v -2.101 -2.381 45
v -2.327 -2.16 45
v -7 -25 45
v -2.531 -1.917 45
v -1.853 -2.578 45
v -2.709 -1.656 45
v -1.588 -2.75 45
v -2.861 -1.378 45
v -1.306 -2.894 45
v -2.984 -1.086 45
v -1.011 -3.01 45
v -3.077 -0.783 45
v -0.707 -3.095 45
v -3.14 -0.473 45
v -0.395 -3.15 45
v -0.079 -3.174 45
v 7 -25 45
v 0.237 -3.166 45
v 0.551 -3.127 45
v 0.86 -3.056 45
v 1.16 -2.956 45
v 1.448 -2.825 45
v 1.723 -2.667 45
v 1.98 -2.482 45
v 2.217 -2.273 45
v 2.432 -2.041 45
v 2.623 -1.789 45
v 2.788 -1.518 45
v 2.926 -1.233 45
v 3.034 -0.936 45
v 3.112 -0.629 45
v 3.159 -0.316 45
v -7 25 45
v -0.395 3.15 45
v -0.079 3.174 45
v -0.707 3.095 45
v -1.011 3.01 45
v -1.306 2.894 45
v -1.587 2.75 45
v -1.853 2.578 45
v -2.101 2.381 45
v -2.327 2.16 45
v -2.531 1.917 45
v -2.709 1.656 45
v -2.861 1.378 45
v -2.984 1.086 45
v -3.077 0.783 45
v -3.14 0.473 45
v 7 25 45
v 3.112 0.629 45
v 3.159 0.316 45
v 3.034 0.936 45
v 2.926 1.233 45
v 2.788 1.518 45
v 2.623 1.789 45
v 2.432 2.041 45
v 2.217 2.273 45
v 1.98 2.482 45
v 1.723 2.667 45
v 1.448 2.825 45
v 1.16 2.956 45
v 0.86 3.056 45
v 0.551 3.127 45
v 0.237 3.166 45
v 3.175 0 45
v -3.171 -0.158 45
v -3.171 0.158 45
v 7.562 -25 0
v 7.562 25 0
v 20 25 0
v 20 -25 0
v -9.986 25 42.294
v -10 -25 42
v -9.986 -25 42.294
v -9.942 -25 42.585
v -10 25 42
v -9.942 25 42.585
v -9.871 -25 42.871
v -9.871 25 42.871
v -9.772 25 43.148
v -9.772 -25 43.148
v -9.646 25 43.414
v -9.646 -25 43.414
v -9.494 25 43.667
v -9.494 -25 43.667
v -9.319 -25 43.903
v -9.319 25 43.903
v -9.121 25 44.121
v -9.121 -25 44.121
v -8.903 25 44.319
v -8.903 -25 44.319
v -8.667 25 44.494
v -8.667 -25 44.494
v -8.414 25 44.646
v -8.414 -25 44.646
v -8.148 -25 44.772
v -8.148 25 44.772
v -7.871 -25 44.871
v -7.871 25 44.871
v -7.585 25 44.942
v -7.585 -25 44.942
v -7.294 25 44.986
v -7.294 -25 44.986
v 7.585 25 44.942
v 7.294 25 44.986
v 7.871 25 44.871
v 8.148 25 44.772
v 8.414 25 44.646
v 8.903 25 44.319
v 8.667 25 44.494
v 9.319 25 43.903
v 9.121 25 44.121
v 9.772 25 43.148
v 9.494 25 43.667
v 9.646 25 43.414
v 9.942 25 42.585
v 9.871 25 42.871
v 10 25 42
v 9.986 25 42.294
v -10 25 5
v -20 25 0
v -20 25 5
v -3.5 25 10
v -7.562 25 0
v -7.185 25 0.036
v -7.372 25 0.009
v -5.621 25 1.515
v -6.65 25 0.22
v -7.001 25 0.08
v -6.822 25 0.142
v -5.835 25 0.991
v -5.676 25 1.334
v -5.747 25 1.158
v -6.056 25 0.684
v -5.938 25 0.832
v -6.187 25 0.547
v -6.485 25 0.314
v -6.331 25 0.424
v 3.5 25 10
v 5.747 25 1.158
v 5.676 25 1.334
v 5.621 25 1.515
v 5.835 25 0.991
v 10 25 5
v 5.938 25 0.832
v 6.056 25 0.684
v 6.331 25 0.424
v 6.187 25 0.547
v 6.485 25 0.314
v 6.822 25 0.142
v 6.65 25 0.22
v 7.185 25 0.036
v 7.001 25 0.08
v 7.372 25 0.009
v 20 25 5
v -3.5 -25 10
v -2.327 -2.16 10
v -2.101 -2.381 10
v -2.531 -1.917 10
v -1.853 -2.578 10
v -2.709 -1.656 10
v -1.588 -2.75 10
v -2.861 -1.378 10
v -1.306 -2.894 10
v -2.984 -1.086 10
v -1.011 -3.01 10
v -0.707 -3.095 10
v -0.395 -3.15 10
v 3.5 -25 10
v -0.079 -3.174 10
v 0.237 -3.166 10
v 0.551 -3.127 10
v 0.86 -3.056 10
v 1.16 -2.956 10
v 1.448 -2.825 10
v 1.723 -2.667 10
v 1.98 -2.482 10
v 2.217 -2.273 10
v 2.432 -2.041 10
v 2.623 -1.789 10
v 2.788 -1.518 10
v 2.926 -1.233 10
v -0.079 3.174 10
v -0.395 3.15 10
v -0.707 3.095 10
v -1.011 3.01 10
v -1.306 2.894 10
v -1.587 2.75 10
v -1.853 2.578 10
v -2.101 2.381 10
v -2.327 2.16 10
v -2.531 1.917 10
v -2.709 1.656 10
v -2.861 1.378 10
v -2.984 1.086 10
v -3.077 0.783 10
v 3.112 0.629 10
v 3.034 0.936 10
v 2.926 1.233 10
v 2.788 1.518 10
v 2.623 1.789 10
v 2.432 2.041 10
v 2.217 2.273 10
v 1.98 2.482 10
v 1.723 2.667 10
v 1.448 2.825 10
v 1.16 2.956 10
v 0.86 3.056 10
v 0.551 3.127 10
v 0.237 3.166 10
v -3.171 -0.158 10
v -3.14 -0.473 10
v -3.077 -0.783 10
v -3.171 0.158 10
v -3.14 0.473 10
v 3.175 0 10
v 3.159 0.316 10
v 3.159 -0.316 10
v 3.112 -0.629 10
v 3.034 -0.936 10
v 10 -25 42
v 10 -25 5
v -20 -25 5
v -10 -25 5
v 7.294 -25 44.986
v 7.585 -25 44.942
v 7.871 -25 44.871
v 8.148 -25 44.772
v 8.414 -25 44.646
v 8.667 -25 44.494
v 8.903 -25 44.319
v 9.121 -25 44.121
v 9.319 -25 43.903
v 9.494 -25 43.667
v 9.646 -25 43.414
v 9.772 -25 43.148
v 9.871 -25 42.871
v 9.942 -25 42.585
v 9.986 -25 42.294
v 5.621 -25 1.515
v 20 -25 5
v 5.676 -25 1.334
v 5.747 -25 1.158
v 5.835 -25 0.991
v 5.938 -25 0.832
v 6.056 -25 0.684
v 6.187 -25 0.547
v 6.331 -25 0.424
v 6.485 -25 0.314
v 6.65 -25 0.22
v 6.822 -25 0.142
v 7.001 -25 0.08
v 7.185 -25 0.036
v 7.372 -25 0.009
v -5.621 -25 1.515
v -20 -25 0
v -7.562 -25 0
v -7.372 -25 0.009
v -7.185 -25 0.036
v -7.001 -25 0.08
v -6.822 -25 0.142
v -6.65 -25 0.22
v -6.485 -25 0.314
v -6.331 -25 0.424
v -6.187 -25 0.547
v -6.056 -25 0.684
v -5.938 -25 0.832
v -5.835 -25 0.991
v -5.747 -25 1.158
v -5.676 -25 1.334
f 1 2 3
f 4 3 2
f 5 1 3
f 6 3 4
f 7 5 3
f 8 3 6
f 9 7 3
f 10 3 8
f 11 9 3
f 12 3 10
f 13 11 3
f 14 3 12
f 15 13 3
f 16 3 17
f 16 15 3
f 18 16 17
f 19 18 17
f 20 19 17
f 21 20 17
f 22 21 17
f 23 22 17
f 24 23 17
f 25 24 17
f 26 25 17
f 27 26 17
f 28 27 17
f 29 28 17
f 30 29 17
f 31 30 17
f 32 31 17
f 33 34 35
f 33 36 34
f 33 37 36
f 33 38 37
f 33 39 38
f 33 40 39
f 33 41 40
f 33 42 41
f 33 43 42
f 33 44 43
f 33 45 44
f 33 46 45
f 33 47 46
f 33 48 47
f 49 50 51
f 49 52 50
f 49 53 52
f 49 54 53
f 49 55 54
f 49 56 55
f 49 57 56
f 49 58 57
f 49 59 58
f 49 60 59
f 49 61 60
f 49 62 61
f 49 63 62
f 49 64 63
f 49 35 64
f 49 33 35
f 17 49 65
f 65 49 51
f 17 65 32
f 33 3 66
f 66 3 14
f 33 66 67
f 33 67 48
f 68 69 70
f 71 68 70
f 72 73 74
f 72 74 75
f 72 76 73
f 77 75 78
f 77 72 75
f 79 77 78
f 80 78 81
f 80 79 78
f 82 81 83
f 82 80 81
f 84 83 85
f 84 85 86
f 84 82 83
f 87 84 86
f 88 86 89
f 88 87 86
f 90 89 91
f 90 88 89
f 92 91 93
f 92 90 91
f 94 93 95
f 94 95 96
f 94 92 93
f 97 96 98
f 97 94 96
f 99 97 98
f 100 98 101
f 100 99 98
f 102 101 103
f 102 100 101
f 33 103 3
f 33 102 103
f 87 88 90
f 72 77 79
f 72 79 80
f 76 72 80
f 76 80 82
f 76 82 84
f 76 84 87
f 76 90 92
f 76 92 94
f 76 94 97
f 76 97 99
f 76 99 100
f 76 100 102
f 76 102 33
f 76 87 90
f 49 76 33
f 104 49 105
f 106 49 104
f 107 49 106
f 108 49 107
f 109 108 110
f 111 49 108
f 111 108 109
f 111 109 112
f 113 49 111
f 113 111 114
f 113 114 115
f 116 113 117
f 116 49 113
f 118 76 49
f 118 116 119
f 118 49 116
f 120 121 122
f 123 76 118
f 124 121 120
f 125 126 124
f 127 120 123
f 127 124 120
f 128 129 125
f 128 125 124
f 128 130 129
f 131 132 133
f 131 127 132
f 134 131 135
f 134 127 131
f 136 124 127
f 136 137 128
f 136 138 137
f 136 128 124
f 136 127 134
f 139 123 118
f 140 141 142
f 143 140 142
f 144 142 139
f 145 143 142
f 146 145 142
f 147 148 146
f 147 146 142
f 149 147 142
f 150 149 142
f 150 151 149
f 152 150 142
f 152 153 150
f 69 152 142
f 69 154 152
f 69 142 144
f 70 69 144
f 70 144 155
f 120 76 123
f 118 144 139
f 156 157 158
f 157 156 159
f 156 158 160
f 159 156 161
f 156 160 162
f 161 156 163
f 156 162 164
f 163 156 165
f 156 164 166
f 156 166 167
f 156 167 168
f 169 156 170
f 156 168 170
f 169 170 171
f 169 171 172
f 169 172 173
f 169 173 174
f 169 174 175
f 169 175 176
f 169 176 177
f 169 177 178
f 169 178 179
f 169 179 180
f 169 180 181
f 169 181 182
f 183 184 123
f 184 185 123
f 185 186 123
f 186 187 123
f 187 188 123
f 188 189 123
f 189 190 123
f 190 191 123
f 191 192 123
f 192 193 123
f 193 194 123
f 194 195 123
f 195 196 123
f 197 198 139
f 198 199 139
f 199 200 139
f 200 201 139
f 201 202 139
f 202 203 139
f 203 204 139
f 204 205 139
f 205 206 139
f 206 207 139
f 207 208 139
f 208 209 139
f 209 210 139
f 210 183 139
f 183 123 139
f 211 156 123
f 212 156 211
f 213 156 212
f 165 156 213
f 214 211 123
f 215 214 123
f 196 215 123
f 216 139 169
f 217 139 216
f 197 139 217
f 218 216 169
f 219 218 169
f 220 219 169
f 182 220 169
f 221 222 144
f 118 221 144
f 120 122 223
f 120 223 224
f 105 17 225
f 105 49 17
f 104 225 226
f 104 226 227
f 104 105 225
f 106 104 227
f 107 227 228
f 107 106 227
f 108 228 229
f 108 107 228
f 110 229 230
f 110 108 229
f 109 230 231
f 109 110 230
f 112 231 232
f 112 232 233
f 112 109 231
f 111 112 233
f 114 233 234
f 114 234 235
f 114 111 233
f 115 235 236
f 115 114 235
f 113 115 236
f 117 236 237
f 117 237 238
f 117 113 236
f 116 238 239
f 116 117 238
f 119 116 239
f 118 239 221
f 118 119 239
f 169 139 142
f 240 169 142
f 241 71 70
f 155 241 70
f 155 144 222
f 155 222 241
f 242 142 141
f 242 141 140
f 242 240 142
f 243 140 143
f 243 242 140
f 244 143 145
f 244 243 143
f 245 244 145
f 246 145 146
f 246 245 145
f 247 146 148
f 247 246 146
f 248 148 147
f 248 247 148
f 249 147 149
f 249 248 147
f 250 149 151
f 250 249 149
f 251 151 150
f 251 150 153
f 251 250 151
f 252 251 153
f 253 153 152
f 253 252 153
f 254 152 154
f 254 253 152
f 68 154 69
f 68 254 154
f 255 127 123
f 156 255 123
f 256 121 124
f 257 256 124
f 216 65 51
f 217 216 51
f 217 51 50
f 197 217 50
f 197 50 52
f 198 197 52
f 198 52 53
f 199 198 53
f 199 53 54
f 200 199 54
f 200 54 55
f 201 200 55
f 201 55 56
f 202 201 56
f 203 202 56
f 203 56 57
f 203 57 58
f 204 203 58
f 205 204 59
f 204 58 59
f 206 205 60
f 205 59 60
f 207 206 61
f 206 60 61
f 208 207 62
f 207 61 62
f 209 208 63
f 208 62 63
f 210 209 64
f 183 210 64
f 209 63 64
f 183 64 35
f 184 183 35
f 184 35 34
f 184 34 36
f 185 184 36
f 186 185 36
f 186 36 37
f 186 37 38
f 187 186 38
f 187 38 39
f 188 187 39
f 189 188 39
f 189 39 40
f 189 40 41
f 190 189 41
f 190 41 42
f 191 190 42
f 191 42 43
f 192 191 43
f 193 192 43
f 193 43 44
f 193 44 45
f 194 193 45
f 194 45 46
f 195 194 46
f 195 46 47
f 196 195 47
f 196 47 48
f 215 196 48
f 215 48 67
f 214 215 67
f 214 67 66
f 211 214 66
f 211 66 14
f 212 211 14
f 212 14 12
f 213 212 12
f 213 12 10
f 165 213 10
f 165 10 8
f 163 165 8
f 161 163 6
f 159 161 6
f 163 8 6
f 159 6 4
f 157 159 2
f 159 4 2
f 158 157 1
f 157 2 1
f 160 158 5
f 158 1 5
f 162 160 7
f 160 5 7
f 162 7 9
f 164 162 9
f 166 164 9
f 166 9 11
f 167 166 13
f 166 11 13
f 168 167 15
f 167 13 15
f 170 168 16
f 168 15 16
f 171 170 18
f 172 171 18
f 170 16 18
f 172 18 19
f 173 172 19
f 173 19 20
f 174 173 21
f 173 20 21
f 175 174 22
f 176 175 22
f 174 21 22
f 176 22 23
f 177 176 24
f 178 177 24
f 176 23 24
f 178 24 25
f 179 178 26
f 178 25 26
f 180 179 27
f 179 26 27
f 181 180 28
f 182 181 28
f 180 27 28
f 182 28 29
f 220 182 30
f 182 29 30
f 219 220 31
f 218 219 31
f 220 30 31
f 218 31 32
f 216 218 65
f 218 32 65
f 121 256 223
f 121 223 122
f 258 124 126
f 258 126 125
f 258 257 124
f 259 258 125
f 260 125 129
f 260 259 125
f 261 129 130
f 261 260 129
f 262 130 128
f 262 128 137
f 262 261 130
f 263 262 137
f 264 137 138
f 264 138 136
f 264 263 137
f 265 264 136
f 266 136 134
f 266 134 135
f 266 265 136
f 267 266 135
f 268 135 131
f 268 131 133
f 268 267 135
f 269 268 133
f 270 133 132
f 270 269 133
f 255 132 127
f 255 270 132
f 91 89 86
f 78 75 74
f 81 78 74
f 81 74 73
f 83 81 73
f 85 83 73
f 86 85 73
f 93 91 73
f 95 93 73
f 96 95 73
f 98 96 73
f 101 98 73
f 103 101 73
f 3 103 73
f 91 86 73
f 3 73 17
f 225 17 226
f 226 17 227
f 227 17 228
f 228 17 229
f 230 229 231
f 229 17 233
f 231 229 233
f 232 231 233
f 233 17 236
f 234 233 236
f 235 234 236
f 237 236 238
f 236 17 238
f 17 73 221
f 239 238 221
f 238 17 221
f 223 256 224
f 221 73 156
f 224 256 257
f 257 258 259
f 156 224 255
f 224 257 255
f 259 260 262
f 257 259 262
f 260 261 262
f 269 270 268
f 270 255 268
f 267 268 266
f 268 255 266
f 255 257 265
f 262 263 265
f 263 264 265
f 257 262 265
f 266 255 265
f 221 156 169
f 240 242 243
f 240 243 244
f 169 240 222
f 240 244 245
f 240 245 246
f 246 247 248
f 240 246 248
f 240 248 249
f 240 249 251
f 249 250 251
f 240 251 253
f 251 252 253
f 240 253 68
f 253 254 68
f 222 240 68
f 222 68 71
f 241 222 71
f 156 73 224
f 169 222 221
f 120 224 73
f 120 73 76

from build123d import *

# Parameters (mm, degrees)
CROQUIS1_W              = 40
CROQUIS1_H              = 50
SALIENTE_EXTRUIR1_DEPTH = 5
CROQUIS2_W              = 20
CROQUIS2_H              = 50
SALIENTE_EXTRUIR2_DEPTH = 40
CORTAR_EXTRUIR1_REACH   = 72.178
REDONDEO1_R             = 2
CORTAR_EXTRUIR2_REACH   = 57.227
CROQUIS4_R              = 3.175
REDONDEO2_R             = 3


with BuildPart() as part:
    # Croquis1 → Saliente-Extruir1 (new body)
    with BuildSketch(Plane.XY):
        Rectangle(CROQUIS1_W, CROQUIS1_H)
    extrude(amount=SALIENTE_EXTRUIR1_DEPTH)

    # Croquis2 → Saliente-Extruir2 (add)
    with BuildSketch(Plane.XY.offset(5)):
        Rectangle(CROQUIS2_W, CROQUIS2_H)
    extrude(amount=SALIENTE_EXTRUIR2_DEPTH)

    # Croquis3 → Cortar-Extruir1 (cut, up to next)
    with BuildSketch(Plane(origin=(0, 25, 0), x_dir=(1, 0, 0), z_dir=(0, 1, 0)), mode=Mode.PRIVATE) as cortar_extruir1_sk1:
        Polygon((-6, 0), (-3.5, -10), (3.5, -10), (6, 0), align=None)
    cortar_extruir1_tool1 = extrude(cortar_extruir1_sk1.sketch, amount=-CORTAR_EXTRUIR1_REACH, mode=Mode.PRIVATE) & part.part
    add(cortar_extruir1_tool1.solids().sort_by_distance((0, 25, 4.561404))[0], mode=Mode.SUBTRACT)

    # Redondeo1
    redondeo1_edges = [part.edges().sort_by_distance(p)[0] for p in [
        (-6, 0, 0),
        (6, 0, 0),
    ]]
    fillet(redondeo1_edges, radius=REDONDEO1_R)

    # Croquis4 → Cortar-Extruir2 (cut, up to next)
    with BuildSketch(Plane.XY.offset(45), mode=Mode.PRIVATE) as cortar_extruir2_sk1:
        Circle(CROQUIS4_R)
    cortar_extruir2_tool1 = extrude(cortar_extruir2_sk1.sketch, amount=-CORTAR_EXTRUIR2_REACH, mode=Mode.PRIVATE) & part.part
    add(cortar_extruir2_tool1.solids().sort_by_distance((0, 0, 45))[0], mode=Mode.SUBTRACT)

    # Redondeo2
    redondeo2_edges = [part.edges().sort_by_distance(p)[0] for p in [
        (10, 0, 45),
        (-10, 0, 45),
    ]]
    fillet(redondeo2_edges, radius=REDONDEO2_R)


solid = part.part
